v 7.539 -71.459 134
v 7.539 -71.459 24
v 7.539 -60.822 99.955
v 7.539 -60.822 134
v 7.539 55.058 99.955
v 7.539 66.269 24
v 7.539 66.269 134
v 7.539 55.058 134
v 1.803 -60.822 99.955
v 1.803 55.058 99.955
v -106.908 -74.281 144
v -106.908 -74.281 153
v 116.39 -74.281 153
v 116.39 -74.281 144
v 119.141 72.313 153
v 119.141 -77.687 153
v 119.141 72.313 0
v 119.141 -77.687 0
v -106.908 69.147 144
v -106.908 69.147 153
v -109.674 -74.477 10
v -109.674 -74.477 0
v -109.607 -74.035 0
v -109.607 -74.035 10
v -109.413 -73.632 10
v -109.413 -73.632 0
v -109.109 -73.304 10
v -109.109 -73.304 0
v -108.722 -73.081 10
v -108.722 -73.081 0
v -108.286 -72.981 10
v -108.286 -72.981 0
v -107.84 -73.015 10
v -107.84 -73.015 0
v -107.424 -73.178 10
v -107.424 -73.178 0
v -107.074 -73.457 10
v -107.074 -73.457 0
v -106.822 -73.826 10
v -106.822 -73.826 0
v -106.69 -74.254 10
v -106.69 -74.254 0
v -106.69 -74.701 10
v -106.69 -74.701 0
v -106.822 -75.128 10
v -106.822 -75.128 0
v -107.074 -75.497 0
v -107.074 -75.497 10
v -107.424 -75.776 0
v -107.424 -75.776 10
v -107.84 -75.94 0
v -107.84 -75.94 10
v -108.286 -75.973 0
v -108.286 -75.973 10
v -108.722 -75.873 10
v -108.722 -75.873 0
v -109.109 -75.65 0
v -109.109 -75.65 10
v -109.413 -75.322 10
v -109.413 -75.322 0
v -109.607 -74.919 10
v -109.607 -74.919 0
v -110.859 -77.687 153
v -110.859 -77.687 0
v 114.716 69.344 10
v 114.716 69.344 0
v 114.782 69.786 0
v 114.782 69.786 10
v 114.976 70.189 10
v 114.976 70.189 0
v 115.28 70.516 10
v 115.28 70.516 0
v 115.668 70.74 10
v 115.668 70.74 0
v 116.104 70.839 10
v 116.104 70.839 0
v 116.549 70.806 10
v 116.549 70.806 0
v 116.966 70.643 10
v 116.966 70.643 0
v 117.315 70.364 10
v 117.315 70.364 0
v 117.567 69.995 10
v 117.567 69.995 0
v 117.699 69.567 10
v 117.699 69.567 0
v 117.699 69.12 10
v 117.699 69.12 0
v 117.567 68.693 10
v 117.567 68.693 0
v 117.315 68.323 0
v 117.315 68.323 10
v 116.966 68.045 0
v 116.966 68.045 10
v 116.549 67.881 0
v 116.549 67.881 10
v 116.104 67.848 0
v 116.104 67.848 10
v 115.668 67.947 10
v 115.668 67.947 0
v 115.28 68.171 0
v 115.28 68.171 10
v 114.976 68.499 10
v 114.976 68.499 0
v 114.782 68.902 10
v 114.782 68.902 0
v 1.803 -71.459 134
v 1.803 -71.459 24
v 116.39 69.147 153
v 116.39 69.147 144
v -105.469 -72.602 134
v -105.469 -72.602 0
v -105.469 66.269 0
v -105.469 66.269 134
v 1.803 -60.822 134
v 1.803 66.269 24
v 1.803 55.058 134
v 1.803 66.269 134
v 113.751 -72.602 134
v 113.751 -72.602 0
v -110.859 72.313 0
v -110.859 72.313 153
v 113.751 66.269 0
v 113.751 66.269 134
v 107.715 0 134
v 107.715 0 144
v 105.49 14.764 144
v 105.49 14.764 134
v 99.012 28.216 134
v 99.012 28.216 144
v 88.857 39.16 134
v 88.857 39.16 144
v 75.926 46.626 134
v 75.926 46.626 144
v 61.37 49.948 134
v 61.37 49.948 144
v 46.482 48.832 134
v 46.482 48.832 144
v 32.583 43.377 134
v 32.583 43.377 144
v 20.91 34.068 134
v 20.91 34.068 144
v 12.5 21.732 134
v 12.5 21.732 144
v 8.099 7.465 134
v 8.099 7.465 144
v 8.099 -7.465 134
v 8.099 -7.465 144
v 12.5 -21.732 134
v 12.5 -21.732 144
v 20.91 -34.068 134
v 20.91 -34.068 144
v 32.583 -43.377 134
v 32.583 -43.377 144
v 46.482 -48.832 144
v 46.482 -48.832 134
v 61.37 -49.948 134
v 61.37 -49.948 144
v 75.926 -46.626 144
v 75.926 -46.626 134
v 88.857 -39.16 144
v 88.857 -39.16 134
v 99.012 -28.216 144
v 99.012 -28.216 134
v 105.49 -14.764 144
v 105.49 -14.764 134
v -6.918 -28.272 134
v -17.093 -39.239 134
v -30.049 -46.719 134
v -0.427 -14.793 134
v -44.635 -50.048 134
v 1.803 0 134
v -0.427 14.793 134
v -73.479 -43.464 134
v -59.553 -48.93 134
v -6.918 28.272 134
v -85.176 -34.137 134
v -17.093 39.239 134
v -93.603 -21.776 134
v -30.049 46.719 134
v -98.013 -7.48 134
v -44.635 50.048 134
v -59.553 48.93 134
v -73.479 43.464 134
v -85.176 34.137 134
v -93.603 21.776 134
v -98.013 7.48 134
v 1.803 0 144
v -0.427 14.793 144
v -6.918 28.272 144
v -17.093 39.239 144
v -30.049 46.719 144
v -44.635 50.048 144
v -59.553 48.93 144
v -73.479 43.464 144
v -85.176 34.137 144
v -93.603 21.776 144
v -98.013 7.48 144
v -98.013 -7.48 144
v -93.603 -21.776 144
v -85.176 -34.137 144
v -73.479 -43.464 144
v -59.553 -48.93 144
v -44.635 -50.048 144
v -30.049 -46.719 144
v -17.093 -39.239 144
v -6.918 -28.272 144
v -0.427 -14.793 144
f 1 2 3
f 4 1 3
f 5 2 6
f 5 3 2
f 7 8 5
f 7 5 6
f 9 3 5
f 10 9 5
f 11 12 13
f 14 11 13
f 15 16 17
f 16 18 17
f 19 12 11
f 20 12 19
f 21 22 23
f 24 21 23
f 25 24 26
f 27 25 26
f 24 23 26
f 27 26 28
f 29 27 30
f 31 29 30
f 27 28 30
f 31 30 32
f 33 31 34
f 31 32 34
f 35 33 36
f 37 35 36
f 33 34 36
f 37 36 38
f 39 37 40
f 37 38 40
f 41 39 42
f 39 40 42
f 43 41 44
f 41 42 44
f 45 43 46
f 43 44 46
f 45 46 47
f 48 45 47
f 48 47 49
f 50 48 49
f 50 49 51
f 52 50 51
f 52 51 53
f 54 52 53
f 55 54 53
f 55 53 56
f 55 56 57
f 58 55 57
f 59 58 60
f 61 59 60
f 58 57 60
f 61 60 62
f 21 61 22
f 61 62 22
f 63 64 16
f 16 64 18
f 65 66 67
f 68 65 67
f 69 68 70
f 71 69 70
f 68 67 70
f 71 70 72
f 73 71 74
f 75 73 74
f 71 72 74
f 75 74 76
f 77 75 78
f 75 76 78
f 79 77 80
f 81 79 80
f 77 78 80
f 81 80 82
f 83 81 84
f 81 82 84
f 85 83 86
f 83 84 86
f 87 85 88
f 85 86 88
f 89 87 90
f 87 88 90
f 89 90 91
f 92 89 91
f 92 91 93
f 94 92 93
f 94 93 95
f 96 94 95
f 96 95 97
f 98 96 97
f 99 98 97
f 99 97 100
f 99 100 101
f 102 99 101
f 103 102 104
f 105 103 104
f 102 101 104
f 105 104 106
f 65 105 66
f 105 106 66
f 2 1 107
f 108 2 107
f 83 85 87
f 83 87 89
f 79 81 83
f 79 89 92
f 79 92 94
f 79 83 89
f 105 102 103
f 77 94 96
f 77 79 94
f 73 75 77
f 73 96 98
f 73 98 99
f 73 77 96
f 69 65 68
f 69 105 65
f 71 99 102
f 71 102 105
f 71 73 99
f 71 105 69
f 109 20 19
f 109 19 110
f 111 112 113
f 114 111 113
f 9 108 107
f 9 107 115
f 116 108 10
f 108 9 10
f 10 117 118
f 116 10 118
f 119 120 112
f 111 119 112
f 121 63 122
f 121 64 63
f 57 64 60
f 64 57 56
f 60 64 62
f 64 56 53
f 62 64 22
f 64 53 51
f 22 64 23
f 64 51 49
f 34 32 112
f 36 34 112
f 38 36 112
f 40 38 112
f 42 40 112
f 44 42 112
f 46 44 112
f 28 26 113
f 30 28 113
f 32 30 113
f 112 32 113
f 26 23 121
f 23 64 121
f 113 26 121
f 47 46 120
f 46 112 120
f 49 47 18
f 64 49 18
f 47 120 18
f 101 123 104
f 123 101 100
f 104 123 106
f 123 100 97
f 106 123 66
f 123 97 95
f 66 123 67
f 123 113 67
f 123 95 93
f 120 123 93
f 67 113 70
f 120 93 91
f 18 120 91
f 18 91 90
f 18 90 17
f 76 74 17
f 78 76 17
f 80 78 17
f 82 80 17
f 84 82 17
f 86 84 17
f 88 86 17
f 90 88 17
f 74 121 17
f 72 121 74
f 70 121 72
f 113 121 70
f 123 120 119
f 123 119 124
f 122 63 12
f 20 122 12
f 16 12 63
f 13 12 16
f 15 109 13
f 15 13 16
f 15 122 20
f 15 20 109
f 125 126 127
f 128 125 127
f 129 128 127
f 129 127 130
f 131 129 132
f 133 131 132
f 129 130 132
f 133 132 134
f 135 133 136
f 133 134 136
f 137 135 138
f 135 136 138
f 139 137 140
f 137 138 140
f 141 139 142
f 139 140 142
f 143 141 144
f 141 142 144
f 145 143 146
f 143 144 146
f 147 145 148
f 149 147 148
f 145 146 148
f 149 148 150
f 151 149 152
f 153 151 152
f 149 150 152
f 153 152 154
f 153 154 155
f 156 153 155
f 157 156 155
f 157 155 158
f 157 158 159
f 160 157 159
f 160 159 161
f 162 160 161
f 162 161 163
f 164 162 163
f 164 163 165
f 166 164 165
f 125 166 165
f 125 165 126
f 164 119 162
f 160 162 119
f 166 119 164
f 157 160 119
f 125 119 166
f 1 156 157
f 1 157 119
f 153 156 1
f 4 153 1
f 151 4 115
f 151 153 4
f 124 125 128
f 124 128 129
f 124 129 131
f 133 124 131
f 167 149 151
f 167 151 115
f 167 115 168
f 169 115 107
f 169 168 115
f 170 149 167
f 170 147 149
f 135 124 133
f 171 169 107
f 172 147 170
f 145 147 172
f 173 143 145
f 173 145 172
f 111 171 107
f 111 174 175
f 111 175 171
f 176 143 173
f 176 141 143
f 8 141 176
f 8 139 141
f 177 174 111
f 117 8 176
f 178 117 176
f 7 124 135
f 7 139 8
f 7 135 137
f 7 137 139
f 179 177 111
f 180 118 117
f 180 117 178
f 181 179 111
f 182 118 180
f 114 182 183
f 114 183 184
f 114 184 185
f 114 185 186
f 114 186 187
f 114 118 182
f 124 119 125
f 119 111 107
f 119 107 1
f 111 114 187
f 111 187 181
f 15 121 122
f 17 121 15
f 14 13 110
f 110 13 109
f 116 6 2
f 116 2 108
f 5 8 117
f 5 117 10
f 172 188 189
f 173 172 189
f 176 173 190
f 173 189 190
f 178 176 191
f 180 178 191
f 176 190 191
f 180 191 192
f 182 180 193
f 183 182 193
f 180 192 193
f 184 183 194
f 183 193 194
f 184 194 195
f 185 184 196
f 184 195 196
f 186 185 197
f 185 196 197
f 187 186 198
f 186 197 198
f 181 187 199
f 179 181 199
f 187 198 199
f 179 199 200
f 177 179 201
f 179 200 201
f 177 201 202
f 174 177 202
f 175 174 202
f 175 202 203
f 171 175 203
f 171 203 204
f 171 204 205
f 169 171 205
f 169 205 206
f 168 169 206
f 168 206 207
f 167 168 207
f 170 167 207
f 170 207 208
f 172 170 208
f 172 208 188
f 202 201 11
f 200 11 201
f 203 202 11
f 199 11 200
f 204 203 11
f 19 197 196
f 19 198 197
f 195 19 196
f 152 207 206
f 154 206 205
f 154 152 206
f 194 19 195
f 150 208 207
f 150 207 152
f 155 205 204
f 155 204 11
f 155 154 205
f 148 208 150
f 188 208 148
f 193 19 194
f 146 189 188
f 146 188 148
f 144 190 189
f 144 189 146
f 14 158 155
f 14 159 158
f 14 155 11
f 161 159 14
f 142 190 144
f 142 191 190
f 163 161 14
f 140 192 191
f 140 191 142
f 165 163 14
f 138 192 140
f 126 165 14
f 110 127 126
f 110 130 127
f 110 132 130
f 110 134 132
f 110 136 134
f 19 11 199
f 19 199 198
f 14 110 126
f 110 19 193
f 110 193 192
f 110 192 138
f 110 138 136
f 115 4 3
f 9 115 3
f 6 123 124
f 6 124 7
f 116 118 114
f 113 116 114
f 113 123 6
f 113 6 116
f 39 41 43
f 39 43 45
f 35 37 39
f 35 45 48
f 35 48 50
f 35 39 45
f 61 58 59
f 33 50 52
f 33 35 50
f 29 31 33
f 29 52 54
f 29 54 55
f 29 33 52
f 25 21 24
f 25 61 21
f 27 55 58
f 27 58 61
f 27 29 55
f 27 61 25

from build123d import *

# Parameters (mm, degrees)
SKETCH1_W           = 230
SKETCH1_H           = 150
BOSS_EXTRUDE1_DEPTH = 150
SKETCH2_R           = 50.188302383
SKETCH2_R_2         = 50.087955562
CUT_EXTRUDE1_DEPTH  = 27
SKETCH3_W           = 219.220450204
SKETCH3_H           = 138.871598106
CUT_EXTRUDE2_DEPTH  = 134
SKETCH4_W           = 230
SKETCH4_H           = 150
BOSS_EXTRUDE2_DEPTH = 3
SKETCH5_W           = 223.297854639
SKETCH5_H           = 143.428697179
CUT_EXTRUDE3_DEPTH  = 9
SKETCH7_W           = 5.736257362
SKETCH7_H           = 137.728394846
BOSS_EXTRUDE5_DEPTH = 110
SKETCH8_R           = 1.5
CUT_EXTRUDE4_DEPTH  = 10
SKETCH9_W           = 34.045014521
SKETCH9_H           = 115.879735823
CUT_EXTRUDE5_DEPTH  = 10


with BuildPart() as part:
    # Sketch1 → Boss-Extrude1 (new body)
    with BuildSketch(Plane.XY):
        with Locations((4.141274238, -2.686980609)):
            Rectangle(SKETCH1_W, SKETCH1_H)
    extrude(amount=BOSS_EXTRUDE1_DEPTH)

    # Sketch2 → Cut-Extrude1 (cut)
    with BuildSketch(Plane.XY.offset(150)):
        with Locations((-48.385288776, 0)):
            Circle(SKETCH2_R)
        with Locations((57.627226531, 0)):
            Circle(SKETCH2_R_2)
    extrude(amount=-CUT_EXTRUDE1_DEPTH, mode=Mode.SUBTRACT)

    # Sketch3 → Cut-Extrude2 (cut)
    with BuildSketch(Plane(origin=(0, 0, 0), x_dir=(-1, 0, 0), z_dir=(0, 0, -1))):
        with Locations((-4.141274238, -3.166675249)):
            Rectangle(SKETCH3_W, SKETCH3_H)
    extrude(amount=-CUT_EXTRUDE2_DEPTH, mode=Mode.SUBTRACT)

    # Sketch4 → Boss-Extrude2 (add)
    with BuildSketch(Plane.XY.offset(150)):
        with Locations((4.141274238, -2.686980609)):
            Rectangle(SKETCH4_W, SKETCH4_H)
    extrude(amount=BOSS_EXTRUDE2_DEPTH)

    # Sketch5 → Cut-Extrude3 (cut)
    with BuildSketch(Plane.XY.offset(153)):
        with Locations((4.740892538, -2.567056949)):
            Rectangle(SKETCH5_W, SKETCH5_H)
    extrude(amount=-CUT_EXTRUDE3_DEPTH, mode=Mode.SUBTRACT)

    # Sketch7 → Boss-Extrude5 (add)
    with BuildSketch(Plane(origin=(0, 0, 134), x_dir=(-1, 0, 0), z_dir=(0, 0, -1))):
        with Locations((-4.671142288, -2.595073619)):
            Rectangle(SKETCH7_W, SKETCH7_H)
    extrude(amount=BOSS_EXTRUDE5_DEPTH)

    # Sketch8 → Cut-Extrude4 (cut)
    with BuildSketch(Plane(origin=(0, 0, 0), x_dir=(-1, 0, 0), z_dir=(0, 0, -1))):
        with Locations((-116.215713327, 69.343694299)):
            Circle(SKETCH8_R)
        with Locations((108.173667939, -74.477152429)):
            Circle(SKETCH8_R)
    extrude(amount=-CUT_EXTRUDE4_DEPTH, mode=Mode.SUBTRACT)

    # Sketch9 → Cut-Extrude5 (cut)
    with BuildSketch(Plane(origin=(7.539270969, 0, 0), x_dir=(0, 0, -1), z_dir=(1, 0, 0))):
        with Locations((-116.97749274, -2.881933203)):
            Rectangle(SKETCH9_W, SKETCH9_H)
    extrude(amount=-CUT_EXTRUDE5_DEPTH, mode=Mode.SUBTRACT)


solid = part.part
